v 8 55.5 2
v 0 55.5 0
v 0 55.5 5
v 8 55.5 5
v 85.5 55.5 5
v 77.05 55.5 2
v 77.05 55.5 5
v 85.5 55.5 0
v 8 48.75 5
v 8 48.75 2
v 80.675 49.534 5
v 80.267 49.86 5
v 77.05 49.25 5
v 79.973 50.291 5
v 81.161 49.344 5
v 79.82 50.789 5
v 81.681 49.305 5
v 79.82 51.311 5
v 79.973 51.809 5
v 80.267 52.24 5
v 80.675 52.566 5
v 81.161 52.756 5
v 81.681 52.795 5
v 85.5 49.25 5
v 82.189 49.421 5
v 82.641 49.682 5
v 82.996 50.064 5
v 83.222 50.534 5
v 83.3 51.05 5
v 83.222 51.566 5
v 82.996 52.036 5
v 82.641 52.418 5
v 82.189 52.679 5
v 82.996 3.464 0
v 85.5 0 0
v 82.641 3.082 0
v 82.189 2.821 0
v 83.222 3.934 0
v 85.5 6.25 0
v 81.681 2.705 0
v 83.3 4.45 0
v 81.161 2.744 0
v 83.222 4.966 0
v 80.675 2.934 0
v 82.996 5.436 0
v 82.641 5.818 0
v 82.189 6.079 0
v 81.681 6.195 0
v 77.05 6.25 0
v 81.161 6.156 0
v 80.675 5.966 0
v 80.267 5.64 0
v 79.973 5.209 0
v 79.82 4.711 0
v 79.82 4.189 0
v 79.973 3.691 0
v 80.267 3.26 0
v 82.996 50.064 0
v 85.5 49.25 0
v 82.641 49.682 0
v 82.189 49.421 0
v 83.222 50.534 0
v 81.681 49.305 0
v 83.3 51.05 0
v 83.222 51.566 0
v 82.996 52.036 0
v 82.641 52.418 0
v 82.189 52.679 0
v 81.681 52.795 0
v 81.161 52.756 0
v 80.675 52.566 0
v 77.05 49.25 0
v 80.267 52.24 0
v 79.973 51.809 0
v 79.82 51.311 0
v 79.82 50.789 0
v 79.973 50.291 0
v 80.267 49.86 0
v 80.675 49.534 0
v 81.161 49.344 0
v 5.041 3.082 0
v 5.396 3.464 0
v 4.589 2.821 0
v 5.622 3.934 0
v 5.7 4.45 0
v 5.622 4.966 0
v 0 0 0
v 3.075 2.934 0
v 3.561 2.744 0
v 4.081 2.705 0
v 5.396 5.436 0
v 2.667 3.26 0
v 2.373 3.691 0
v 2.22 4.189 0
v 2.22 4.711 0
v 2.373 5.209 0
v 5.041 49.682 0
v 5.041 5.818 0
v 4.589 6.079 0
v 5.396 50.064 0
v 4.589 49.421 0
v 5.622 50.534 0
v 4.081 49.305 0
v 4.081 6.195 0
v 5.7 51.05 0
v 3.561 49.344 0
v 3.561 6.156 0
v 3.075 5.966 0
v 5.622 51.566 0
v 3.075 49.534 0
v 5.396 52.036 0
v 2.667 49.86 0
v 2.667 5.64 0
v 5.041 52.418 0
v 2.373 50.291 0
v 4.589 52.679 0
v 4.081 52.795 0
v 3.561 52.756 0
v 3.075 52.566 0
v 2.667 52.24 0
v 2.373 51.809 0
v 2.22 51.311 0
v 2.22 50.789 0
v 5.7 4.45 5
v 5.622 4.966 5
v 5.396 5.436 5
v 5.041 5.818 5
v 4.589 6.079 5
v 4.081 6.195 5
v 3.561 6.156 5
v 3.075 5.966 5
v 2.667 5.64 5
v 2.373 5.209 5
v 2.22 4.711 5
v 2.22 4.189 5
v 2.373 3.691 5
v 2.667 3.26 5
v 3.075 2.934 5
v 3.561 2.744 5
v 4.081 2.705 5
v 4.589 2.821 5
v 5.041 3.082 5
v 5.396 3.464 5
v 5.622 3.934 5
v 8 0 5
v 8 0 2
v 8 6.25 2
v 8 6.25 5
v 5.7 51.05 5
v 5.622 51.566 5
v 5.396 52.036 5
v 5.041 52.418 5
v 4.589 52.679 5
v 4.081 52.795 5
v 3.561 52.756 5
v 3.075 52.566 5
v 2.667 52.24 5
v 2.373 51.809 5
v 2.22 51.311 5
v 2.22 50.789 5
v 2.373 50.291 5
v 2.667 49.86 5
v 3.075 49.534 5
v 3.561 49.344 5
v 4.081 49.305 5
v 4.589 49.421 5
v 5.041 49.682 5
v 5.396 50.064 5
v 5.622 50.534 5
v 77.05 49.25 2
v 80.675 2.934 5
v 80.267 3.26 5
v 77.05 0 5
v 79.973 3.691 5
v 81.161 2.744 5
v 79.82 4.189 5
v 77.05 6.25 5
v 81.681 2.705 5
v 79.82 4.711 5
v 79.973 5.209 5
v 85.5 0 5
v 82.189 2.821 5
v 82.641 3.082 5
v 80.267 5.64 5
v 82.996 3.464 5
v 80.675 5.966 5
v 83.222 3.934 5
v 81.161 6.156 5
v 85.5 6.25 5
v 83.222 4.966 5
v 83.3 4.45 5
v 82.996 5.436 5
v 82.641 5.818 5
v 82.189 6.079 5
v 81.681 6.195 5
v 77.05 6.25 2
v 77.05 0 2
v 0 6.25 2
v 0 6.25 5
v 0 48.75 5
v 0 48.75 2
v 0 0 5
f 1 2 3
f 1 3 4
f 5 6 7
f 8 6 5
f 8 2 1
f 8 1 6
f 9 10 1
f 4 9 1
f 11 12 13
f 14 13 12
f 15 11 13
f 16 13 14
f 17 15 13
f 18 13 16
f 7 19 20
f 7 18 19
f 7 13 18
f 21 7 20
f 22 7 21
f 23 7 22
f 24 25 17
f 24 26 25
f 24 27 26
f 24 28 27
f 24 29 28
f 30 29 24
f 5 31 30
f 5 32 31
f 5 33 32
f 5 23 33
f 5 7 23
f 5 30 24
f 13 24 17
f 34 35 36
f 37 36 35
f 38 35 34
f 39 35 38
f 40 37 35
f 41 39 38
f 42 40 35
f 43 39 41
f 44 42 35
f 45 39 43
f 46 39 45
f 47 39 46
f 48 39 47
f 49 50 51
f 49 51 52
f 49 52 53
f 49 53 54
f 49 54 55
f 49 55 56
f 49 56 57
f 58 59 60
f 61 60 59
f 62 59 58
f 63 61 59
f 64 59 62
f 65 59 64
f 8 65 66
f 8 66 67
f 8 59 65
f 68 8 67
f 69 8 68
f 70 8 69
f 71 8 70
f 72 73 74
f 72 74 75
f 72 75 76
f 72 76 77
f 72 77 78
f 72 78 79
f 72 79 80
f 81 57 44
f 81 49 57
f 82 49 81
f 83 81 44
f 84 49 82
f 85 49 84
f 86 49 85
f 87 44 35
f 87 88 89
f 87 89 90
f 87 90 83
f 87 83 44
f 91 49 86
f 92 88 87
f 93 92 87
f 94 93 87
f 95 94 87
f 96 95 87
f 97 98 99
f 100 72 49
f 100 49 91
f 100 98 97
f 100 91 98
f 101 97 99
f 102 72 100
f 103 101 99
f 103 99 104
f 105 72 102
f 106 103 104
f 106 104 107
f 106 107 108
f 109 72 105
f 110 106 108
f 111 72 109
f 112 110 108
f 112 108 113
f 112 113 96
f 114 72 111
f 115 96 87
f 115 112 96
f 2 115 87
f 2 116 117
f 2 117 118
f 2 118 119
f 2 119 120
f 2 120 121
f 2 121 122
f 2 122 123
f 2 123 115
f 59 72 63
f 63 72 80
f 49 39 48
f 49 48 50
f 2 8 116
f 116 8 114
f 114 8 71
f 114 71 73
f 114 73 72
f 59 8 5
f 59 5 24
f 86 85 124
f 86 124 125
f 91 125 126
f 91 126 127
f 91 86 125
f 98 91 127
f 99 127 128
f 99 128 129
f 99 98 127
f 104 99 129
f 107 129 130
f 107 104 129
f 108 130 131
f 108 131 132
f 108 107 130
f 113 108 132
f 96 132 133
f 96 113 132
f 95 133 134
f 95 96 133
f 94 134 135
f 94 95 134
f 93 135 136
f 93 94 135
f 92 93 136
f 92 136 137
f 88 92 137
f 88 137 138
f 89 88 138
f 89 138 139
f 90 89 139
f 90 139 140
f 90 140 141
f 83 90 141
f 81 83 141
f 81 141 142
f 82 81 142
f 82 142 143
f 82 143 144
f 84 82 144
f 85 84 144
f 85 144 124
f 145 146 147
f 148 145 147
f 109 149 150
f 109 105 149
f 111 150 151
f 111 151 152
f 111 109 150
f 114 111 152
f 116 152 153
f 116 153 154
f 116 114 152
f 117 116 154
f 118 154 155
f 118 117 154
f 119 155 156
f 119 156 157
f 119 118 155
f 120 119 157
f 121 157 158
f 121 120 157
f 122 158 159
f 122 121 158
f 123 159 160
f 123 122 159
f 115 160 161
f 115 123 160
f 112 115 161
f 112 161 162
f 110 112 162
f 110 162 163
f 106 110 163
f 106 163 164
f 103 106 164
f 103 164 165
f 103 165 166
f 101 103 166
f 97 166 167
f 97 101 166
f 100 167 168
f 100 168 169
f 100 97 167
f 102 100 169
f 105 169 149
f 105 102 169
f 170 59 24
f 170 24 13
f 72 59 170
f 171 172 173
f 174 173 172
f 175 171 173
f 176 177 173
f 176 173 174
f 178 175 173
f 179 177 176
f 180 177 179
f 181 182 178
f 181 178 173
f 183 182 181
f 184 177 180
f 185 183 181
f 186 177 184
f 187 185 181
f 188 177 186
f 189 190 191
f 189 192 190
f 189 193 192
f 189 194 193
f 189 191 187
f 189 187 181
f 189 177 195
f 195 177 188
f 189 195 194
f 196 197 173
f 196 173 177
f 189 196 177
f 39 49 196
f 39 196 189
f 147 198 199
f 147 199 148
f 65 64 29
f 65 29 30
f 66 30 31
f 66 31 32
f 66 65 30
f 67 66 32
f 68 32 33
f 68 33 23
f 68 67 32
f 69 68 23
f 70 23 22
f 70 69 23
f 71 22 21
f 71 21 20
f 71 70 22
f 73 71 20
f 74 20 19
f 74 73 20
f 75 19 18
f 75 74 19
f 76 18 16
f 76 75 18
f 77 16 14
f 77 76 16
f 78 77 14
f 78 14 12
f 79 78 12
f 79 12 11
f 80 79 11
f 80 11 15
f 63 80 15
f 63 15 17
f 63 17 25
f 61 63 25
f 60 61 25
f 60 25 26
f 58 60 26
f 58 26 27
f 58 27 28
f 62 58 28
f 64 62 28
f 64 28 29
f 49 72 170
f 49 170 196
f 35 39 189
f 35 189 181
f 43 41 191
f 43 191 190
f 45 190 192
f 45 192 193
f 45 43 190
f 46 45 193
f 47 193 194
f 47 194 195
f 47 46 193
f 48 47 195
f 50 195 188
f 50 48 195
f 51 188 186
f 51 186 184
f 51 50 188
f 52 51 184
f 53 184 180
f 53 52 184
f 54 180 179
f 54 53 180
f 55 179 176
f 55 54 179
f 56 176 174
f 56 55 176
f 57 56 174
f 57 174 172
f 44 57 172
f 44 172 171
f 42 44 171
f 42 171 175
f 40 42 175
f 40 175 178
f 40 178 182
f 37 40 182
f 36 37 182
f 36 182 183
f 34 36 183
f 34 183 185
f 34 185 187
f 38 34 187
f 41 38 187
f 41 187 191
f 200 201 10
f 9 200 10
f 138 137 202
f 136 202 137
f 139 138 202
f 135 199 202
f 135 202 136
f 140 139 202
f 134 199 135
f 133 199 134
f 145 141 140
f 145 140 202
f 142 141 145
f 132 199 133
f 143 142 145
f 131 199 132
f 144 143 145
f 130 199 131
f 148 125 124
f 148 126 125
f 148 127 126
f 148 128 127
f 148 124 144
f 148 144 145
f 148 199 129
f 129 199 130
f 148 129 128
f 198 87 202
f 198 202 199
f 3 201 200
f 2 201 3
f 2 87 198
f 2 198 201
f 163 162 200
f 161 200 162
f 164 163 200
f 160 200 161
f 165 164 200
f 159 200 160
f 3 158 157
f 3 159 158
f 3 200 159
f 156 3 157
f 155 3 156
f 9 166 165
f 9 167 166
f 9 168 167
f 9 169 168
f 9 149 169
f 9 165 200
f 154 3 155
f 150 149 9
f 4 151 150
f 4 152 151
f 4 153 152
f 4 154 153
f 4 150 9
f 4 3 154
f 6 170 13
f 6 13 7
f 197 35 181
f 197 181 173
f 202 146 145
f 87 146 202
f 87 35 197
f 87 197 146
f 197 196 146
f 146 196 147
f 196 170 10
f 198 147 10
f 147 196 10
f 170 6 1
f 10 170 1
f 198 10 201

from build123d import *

# Parameters (mm, degrees)
SKETCH_1_R      = 1.75
EXTRUDE_1_DEPTH = 2
SKETCH_3_W      = 8
SKETCH_3_H      = 6.75
SKETCH_3_R      = 1.75
SKETCH_3_H_2    = 6.25
SKETCH_3_W_2    = 8.45
EXTRUDE_2_DEPTH = 3


with BuildPart() as part:
    # 草图1 → 凸台-拉伸1 (new body)
    with BuildSketch(Plane.XY):
        Polygon((85.5, 49.25), (77.05, 49.25), (77.05, 6.25), (85.5, 6.25), (85.5, 0), (0, 0), (0, 55.5), (85.5, 55.5), align=None)
        with Locations((3.95, 51.05)):
            Circle(SKETCH_1_R, mode=Mode.SUBTRACT)
        with Locations((81.55, 51.05)):
            Circle(SKETCH_1_R, mode=Mode.SUBTRACT)
        with Locations((3.95, 4.45)):
            Circle(SKETCH_1_R, mode=Mode.SUBTRACT)
        with Locations((81.55, 4.45)):
            Circle(SKETCH_1_R, mode=Mode.SUBTRACT)
    extrude(amount=EXTRUDE_1_DEPTH)

    # 草图3 → 凸台-拉伸2 (add)
    # profile 1 of 4: a face of its own
    with BuildSketch(Plane.XY.offset(2)):
        with Locations((4, 52.125)):
            Rectangle(SKETCH_3_W, SKETCH_3_H)
        with Locations((3.95, 51.05)):
            Circle(SKETCH_3_R, mode=Mode.SUBTRACT)
    # profile 2 of 4: a face of its own
    with BuildSketch(Plane.XY.offset(2)):
        with Locations((4, 3.125)):
            Rectangle(SKETCH_3_W, SKETCH_3_H_2)
        with Locations((3.95, 4.45)):
            Circle(SKETCH_3_R, mode=Mode.SUBTRACT)
    # profile 3 of 4: a face of its own
    with BuildSketch(Plane.XY.offset(2)):
        with Locations((81.275, 52.375)):
            Rectangle(SKETCH_3_W_2, SKETCH_3_H_2)
        with Locations((81.55, 51.05)):
            Circle(SKETCH_3_R, mode=Mode.SUBTRACT)
    # profile 4 of 4: a face of its own
    with BuildSketch(Plane.XY.offset(2)):
        with Locations((81.275, 3.125)):
            Rectangle(SKETCH_3_W_2, SKETCH_3_H_2)
        with Locations((81.55, 4.45)):
            Circle(SKETCH_3_R, mode=Mode.SUBTRACT)
    extrude(amount=EXTRUDE_2_DEPTH)


solid = part.part
